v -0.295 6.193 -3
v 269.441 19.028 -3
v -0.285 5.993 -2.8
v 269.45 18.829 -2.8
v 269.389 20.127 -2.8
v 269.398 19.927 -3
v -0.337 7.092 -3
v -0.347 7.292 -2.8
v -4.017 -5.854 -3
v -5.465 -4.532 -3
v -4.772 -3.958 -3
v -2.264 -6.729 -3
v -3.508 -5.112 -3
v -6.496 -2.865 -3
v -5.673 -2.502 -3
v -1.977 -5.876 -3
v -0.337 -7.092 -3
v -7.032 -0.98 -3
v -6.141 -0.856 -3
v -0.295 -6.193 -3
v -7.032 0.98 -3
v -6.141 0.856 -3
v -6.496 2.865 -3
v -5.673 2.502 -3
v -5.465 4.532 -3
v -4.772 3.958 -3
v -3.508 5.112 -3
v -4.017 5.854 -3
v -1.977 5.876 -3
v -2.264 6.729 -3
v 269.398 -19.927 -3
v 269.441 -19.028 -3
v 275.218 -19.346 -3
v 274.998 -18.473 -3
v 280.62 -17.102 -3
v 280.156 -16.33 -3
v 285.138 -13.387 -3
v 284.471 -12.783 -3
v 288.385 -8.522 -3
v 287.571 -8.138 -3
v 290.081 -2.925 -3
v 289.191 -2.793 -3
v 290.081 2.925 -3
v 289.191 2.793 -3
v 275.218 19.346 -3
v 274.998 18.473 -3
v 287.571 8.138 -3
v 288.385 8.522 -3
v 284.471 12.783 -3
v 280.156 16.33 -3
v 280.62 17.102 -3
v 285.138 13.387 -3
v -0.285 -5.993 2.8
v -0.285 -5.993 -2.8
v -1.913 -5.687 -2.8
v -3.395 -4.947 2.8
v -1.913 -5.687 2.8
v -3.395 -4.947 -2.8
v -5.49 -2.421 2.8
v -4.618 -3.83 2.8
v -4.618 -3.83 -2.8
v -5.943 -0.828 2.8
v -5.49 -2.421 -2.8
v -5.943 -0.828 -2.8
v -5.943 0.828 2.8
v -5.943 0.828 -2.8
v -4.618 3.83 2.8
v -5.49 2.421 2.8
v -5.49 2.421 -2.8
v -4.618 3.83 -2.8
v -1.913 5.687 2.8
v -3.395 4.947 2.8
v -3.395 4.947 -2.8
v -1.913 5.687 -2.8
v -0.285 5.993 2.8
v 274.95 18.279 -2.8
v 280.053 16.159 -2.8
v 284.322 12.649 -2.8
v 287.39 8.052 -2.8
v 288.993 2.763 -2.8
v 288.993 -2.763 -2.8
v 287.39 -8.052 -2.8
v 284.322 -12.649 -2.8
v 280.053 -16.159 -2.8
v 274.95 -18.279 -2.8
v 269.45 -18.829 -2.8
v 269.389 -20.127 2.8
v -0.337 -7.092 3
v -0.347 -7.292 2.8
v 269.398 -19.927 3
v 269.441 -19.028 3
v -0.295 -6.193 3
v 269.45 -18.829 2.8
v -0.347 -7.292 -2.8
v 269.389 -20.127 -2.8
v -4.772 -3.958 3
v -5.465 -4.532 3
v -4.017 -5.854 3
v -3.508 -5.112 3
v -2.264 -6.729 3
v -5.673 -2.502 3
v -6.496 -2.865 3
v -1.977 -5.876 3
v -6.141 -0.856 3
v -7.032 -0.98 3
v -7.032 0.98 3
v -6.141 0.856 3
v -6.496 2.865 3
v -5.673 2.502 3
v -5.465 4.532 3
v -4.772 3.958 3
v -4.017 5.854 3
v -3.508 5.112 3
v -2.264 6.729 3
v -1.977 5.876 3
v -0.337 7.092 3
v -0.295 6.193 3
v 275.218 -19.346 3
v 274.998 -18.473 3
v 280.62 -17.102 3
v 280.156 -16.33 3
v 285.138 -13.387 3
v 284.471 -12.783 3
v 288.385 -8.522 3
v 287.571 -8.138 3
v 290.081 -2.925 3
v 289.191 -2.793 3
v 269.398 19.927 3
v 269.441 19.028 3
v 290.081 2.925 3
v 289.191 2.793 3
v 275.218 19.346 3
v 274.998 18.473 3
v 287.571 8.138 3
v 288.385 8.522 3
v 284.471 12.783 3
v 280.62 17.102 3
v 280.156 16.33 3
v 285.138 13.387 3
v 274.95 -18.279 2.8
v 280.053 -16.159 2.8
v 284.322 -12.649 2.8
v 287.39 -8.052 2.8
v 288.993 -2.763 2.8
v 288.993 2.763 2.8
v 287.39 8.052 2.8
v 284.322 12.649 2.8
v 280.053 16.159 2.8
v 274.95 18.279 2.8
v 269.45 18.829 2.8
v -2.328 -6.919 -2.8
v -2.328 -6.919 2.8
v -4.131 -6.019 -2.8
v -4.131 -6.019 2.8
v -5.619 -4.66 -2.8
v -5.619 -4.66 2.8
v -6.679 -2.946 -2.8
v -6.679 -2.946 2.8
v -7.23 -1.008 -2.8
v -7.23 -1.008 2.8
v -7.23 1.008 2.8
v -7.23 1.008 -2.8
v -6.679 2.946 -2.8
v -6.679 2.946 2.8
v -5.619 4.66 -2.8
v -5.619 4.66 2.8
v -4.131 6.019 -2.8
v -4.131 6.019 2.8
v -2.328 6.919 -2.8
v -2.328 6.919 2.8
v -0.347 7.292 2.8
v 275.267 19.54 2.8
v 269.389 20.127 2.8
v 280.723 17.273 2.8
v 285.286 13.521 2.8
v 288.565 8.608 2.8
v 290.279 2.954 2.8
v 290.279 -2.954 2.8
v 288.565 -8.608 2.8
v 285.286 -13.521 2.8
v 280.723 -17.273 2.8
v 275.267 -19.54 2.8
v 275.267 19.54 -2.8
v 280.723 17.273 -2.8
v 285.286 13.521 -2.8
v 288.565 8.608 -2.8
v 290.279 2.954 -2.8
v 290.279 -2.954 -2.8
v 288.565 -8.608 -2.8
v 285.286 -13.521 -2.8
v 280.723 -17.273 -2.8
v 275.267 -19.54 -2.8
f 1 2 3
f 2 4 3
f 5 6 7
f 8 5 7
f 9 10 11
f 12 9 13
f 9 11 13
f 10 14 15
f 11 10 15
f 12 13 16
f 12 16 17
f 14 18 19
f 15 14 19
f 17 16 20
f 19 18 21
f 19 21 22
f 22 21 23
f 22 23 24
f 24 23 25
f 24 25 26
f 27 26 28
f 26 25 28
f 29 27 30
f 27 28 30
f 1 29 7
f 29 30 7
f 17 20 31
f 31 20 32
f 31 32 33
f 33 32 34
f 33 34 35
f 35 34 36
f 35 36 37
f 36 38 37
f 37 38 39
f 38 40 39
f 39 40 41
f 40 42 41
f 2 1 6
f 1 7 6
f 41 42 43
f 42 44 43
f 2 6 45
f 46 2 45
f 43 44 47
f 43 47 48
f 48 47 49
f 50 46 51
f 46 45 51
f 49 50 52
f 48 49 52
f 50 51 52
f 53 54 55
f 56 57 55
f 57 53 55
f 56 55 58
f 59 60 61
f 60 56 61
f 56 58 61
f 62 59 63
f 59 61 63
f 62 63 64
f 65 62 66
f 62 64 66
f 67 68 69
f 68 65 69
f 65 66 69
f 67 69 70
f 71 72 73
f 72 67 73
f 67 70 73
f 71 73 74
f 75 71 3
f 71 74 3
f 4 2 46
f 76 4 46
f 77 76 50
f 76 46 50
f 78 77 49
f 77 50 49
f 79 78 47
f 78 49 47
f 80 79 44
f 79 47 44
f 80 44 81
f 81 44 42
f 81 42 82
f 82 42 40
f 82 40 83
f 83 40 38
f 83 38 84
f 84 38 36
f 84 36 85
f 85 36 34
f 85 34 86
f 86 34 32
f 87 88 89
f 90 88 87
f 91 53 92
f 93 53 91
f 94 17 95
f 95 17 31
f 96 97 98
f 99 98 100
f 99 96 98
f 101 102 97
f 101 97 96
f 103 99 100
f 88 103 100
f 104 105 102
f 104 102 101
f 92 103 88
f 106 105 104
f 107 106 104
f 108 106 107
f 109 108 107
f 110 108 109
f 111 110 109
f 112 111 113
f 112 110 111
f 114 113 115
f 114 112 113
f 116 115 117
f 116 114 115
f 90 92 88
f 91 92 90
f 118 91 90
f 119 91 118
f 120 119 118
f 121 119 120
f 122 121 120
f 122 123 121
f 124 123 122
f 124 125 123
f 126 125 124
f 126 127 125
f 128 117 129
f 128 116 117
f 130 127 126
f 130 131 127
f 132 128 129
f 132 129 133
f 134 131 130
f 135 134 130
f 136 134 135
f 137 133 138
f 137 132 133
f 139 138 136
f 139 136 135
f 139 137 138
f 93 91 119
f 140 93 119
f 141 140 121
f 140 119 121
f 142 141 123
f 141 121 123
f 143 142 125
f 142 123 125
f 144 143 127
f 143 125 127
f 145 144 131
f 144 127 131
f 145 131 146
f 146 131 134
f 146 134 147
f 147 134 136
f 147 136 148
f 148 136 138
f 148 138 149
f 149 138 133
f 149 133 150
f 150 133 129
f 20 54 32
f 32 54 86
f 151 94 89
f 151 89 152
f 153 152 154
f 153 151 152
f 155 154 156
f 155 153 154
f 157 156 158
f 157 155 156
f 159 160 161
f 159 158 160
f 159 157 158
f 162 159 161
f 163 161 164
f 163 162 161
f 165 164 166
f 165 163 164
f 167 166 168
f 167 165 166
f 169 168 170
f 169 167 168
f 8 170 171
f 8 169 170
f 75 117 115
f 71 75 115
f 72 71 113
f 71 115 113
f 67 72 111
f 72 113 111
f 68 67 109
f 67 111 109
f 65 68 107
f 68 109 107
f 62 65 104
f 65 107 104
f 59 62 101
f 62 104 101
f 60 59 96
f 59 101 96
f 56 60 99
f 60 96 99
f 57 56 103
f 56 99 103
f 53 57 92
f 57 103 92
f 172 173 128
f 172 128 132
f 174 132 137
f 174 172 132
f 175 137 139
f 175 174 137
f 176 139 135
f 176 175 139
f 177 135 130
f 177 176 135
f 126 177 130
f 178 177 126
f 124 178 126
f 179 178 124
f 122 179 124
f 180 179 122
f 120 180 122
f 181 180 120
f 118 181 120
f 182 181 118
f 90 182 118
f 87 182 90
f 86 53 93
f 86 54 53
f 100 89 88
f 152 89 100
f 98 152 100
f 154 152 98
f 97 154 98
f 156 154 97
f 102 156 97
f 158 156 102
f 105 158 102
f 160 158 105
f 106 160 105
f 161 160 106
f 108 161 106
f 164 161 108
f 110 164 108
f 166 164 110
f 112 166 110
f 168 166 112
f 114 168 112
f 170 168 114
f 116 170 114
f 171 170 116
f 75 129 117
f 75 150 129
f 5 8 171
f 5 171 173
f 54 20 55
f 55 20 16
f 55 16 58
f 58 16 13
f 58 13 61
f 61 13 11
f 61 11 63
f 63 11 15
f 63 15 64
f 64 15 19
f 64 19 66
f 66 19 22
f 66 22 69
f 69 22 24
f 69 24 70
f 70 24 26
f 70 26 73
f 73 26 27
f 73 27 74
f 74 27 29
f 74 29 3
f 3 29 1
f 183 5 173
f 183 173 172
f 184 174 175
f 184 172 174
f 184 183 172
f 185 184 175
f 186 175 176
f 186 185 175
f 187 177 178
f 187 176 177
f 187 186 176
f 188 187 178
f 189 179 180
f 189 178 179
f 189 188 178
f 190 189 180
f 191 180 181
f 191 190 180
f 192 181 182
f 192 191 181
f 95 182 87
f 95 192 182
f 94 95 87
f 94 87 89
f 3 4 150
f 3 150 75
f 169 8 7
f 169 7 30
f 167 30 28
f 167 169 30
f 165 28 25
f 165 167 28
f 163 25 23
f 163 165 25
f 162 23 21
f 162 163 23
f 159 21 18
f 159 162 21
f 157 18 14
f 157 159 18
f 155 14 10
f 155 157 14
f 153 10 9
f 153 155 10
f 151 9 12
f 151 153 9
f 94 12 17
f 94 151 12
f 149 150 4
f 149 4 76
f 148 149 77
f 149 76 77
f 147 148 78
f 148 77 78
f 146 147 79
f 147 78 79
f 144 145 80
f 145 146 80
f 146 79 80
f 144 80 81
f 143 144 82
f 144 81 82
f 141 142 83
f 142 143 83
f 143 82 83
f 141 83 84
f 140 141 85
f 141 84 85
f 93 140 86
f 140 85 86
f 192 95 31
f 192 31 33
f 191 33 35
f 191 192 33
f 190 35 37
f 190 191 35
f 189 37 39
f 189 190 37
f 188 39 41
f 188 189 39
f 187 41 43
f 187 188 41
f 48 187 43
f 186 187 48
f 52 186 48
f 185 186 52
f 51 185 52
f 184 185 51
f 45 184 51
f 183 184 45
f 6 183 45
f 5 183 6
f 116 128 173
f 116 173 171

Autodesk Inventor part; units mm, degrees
ref_plane "YZ Plane" through (0, 0, 0) normal (1, 0, 0) x (0, 1, 0)
ref_plane "XZ Plane" through (0, 0, 0) normal (0, 1, 0) x (-1, 0, 0)
ref_plane "XY Plane" through (0, 0, 0) normal (0, 0, 1) x (1, 0, 0)
sketch "Sketch1" plane through (0, 0, 0) normal (0, 0, 1) x (1, 0, 0)
  arc A0 (-0.2852, 5.9932) -> (-0.2852, -5.9932) centre (0, 0) ccw
  arc A1 (269.4505, -18.8287) -> (269.4505, 18.8287) centre (270.3465, 0) ccw
  line L0 (269.4505, 18.8287) -> (-0.2852, 5.9932)
  line L1 (-0.2852, -5.9932) -> (269.4505, -18.8287)
  line L2 (-0.347, 7.2917) -> (269.3887, 20.1272)
  arc A2 (269.3887, -20.1272) -> (269.3887, 20.1272) centre (270.3465, 0) ccw
  line L3 (269.3887, -20.1272) -> (-0.347, -7.2917)
  arc A3 (-0.347, 7.2917) -> (-0.347, -7.2917) centre (0, 0) ccw
  dimension "d0" = 12
  dimension "d1" = 37.7
  dimension "d3" = 1.3
  dimension "d9" = 270.3465
extrude "Extrusion1" add sketch "Sketch1" along normal mid plane 6
chamfer "Chamfer1" distance 0.2 angle 45 16 edges at (289.1965, 0, 3) (134.5826, -12.411, 3) (-6, 0, 3) (134.5826, 12.411, 3) (289.1965, 0, -3) (134.5826, 12.411, -3) (-6, 0, -3) (134.5826, -12.411, -3) (290.4965, 0, 3) (134.5209, 13.7095, 3) (-7.3, 0, 3) (134.5209, -13.7095, 3) (290.4965, 0, -3) (134.5209, -13.7095, -3) (-7.3, 0, -3) (134.5209, 13.7095, -3)
properties part number "Tandriem20naar60T-696mm" material "Rubber"
